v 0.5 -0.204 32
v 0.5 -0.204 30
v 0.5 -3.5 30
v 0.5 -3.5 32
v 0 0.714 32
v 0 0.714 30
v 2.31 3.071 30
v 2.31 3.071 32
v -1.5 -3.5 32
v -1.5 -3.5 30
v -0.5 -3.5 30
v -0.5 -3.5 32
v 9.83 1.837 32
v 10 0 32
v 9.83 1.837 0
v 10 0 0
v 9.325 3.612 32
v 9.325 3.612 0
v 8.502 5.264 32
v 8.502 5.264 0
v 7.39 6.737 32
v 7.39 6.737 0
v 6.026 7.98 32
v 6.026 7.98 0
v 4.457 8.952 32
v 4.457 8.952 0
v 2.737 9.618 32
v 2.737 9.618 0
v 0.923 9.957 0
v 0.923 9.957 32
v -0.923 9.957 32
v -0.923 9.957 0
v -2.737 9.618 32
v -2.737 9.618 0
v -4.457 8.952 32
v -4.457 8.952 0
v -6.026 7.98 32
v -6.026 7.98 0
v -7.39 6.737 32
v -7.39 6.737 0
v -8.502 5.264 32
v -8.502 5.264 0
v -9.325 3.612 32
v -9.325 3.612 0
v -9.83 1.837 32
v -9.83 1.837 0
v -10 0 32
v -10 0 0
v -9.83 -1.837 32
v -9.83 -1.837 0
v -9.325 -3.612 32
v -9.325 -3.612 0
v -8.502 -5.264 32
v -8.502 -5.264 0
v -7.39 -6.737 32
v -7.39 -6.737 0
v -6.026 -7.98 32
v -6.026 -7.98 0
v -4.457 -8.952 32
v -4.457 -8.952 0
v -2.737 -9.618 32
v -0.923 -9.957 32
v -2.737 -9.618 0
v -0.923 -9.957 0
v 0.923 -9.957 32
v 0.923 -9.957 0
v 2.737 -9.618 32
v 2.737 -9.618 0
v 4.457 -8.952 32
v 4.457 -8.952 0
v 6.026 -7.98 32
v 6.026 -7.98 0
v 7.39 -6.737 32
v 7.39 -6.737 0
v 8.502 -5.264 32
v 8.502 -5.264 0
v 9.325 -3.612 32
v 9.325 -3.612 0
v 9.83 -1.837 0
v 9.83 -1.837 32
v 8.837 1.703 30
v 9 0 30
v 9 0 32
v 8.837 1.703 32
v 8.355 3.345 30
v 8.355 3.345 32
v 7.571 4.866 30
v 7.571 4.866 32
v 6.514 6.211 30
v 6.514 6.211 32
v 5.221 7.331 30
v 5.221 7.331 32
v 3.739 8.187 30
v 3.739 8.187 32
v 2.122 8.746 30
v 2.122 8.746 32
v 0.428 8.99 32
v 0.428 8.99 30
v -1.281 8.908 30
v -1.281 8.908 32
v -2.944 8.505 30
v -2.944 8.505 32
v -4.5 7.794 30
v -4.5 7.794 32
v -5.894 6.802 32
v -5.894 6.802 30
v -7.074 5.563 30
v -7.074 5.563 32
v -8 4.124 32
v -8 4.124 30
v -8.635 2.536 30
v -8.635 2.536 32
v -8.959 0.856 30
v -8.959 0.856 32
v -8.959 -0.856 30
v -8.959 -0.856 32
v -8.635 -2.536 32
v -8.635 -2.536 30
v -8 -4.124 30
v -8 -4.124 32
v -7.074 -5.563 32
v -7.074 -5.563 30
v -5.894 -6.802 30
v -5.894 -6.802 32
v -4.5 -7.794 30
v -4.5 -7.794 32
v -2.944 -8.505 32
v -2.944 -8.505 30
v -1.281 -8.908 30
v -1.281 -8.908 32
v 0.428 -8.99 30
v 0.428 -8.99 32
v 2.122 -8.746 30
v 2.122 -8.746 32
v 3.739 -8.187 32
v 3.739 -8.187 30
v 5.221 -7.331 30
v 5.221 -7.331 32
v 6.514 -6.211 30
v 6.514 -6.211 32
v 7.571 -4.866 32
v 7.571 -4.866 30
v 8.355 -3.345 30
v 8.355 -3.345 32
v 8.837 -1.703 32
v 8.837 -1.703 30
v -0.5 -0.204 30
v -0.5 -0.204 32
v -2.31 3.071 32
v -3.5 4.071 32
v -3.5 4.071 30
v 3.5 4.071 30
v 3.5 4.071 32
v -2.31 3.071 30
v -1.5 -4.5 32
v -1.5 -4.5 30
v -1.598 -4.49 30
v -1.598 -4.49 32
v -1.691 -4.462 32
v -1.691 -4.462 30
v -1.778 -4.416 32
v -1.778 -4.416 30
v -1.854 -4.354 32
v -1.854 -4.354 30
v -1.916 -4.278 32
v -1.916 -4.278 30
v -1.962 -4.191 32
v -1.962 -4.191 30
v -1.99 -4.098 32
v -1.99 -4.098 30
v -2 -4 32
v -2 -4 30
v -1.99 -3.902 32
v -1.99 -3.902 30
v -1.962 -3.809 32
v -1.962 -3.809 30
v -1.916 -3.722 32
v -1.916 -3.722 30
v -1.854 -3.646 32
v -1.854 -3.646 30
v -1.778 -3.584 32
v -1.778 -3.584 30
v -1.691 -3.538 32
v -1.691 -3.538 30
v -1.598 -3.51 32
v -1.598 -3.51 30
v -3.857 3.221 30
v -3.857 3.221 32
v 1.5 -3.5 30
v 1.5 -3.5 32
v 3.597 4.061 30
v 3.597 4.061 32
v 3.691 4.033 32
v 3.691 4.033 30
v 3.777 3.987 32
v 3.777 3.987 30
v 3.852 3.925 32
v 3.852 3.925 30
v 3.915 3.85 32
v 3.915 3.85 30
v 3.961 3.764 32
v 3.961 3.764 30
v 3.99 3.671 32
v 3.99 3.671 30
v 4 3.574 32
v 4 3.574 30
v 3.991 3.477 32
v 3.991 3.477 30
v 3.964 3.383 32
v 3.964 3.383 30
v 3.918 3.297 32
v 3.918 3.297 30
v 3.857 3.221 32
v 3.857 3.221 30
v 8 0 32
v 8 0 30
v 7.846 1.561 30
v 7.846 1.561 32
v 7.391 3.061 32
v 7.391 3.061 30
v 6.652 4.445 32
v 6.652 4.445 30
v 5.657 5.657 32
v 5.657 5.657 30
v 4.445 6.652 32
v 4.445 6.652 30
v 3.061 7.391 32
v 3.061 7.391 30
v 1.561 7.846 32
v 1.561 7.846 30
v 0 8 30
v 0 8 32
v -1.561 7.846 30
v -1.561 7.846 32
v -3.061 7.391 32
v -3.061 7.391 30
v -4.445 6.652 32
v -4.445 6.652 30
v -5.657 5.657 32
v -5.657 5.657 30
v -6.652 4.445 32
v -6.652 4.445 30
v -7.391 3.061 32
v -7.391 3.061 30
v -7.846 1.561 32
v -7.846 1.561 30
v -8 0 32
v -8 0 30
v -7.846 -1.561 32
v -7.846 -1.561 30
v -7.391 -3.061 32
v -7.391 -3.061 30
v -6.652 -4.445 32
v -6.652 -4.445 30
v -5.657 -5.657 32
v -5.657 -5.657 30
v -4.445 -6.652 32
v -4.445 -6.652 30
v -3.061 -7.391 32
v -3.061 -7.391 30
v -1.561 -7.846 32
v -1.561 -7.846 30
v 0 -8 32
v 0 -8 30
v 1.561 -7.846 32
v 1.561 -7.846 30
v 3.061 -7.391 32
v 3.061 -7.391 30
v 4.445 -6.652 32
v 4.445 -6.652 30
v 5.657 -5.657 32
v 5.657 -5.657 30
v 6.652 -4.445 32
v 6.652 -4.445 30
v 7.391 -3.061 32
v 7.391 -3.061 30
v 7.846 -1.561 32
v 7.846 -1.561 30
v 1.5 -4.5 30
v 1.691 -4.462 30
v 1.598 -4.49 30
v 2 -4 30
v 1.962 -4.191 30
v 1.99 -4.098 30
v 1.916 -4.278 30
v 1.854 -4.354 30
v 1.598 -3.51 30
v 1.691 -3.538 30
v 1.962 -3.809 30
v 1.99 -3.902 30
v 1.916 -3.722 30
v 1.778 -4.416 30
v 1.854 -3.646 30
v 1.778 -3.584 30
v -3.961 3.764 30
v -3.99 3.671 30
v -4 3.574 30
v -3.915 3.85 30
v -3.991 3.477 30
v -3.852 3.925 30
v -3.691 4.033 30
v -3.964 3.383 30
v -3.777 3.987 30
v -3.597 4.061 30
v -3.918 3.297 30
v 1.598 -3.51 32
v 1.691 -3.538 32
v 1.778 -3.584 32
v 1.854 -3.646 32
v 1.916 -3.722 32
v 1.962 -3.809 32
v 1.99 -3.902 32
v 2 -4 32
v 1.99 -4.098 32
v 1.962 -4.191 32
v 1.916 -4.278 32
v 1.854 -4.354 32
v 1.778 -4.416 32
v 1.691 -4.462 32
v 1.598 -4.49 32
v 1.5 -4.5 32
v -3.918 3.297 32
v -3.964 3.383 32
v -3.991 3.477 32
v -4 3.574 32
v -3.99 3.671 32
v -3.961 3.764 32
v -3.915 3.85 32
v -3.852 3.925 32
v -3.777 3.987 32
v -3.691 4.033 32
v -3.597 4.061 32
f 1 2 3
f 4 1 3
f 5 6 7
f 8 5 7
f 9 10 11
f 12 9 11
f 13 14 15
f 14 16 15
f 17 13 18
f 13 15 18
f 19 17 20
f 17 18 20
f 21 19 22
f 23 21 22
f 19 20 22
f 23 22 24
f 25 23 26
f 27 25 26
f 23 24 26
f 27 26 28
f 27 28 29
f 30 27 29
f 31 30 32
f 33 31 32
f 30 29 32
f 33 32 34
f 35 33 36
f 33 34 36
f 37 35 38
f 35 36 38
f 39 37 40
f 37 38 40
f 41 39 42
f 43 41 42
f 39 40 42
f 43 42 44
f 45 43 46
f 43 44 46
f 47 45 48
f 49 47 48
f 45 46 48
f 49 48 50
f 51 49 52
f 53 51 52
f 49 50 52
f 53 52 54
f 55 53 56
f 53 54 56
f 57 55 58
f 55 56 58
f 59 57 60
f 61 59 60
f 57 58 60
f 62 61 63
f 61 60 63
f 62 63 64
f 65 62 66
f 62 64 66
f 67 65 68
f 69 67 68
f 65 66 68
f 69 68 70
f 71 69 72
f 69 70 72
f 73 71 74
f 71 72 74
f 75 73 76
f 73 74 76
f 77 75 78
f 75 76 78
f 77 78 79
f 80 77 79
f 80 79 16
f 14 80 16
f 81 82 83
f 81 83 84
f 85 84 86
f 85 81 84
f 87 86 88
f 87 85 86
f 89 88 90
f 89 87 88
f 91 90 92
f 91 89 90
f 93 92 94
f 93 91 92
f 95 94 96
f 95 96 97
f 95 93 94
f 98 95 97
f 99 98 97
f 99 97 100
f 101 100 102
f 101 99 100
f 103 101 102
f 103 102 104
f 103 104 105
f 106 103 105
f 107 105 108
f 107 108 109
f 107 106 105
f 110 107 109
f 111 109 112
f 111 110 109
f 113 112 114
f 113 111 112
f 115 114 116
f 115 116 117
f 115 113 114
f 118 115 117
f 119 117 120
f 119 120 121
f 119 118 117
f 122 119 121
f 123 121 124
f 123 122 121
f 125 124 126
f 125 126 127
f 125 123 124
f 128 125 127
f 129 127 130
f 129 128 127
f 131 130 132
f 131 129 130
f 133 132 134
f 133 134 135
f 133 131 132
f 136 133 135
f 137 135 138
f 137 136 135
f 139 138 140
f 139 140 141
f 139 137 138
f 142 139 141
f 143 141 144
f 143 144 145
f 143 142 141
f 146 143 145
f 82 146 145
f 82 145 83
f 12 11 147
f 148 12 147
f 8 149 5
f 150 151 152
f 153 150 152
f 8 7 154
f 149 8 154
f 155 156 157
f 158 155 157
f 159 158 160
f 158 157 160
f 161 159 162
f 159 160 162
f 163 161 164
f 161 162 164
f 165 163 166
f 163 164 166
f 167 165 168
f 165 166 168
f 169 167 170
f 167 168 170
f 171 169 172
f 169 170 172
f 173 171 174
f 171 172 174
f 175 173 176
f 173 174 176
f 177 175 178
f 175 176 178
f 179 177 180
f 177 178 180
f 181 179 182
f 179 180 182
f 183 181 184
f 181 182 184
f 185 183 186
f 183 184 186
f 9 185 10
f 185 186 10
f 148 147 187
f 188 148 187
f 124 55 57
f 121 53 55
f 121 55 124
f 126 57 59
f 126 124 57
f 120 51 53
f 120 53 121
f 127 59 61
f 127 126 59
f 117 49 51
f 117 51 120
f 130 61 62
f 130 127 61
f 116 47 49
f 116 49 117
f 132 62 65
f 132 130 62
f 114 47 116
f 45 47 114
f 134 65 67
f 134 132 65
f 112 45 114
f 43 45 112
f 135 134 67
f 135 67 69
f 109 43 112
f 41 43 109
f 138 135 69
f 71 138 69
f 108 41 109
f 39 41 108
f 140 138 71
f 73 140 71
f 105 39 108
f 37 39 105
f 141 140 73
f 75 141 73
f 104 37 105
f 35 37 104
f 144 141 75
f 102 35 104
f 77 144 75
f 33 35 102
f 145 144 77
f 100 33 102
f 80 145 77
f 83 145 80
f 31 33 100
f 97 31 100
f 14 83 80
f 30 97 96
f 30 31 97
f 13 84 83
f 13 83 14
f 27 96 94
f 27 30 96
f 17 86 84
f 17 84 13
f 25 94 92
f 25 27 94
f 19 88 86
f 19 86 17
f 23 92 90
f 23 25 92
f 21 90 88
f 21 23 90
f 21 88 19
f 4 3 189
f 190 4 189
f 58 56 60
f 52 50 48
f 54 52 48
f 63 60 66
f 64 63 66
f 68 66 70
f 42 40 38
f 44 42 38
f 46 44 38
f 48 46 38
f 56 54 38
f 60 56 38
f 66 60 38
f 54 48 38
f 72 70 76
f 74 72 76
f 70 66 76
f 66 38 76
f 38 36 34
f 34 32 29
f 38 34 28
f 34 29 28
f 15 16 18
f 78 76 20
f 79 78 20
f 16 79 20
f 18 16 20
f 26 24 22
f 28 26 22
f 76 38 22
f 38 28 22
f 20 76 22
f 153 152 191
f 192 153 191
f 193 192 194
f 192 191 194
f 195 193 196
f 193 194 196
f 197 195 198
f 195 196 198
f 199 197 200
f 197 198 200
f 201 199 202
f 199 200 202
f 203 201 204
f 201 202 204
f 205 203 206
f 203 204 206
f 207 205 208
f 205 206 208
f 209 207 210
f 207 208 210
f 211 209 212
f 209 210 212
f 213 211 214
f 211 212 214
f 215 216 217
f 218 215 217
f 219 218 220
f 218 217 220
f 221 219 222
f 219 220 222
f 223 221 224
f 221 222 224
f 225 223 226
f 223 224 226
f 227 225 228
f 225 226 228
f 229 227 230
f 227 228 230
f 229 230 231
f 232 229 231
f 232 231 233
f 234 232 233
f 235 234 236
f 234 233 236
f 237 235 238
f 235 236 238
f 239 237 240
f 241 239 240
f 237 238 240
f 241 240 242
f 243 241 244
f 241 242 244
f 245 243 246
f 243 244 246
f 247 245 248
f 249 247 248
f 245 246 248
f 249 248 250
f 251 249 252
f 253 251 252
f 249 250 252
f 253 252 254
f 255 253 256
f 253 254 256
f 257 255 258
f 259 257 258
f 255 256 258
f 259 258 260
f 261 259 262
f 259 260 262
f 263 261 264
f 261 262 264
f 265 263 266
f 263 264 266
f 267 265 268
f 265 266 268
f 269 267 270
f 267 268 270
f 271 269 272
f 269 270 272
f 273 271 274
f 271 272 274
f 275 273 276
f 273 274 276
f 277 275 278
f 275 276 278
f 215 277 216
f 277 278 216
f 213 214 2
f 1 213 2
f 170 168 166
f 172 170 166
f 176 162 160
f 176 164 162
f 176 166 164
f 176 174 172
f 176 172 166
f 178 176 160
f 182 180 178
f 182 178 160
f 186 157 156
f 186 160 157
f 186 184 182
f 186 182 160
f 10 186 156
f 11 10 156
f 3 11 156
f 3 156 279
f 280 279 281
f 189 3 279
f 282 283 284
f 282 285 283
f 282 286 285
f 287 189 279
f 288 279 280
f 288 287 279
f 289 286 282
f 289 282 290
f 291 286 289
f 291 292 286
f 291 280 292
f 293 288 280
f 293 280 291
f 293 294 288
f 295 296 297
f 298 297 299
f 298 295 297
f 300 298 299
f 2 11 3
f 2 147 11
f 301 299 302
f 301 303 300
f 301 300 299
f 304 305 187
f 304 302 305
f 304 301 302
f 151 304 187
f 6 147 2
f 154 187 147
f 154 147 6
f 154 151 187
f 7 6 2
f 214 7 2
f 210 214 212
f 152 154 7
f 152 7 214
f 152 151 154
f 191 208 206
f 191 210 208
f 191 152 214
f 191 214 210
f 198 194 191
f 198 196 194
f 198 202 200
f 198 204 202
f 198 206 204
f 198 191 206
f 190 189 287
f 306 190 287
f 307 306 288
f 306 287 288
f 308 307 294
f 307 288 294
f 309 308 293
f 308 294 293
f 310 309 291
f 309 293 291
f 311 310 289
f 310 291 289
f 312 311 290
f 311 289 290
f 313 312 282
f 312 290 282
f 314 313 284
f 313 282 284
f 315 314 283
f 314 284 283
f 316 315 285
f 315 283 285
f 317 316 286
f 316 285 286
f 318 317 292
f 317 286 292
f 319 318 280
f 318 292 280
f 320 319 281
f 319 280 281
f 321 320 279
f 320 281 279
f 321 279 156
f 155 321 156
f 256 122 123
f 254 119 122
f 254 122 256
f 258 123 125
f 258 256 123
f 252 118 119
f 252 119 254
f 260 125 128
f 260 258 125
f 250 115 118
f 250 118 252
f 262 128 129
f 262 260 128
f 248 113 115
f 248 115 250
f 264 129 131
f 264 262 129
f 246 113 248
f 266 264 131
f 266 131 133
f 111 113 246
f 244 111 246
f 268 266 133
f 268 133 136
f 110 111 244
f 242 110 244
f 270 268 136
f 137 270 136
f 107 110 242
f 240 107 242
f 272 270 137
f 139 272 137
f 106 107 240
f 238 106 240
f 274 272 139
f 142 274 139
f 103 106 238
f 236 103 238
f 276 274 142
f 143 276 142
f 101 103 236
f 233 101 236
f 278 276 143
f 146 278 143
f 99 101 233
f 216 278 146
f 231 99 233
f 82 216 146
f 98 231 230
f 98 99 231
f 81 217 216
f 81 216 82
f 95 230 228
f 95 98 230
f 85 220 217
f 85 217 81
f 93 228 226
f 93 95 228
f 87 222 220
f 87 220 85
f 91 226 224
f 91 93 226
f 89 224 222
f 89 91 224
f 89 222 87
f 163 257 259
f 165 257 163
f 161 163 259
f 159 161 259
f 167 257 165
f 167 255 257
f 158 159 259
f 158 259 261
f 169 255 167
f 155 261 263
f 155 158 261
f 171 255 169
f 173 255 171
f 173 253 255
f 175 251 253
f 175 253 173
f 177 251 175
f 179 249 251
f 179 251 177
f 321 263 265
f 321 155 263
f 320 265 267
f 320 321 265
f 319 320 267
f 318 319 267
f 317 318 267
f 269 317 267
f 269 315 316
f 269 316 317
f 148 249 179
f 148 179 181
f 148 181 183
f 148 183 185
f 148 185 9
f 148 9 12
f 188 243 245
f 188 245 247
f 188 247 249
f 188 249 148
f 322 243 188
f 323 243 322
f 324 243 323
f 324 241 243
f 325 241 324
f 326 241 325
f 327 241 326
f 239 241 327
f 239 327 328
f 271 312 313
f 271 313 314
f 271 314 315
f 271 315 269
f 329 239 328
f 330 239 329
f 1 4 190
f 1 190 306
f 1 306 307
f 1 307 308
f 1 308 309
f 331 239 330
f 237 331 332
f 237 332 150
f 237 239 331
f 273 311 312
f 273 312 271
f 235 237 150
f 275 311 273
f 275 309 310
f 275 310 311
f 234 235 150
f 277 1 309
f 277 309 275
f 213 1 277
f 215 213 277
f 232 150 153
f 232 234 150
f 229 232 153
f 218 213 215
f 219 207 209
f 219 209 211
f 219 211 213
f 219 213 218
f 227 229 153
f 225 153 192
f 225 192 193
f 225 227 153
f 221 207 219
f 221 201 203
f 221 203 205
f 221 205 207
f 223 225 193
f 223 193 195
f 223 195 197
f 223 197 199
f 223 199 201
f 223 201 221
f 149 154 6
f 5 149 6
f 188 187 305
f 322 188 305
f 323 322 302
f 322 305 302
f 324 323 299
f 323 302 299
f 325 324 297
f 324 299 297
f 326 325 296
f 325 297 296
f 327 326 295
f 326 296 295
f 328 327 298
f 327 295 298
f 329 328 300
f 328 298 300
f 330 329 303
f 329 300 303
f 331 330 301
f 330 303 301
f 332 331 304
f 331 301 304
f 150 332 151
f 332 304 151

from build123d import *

# Parameters (mm, degrees)
F0_R     = 10
F1_DEPTH = 30
F2_R     = 10
F2_R_2   = 9
F2_R_3   = 8
F3_DEPTH = 2


with BuildPart() as f1:
    # F0 (on Top) → F1 (new body)
    with BuildSketch(Plane.XY):
        Circle(F0_R)
    extrude(amount=F1_DEPTH)

    # F2 (on face) → F3 (join)
    with BuildSketch(Plane.XY.offset(30)):
        Circle(F2_R)
        Circle(F2_R_2, mode=Mode.SUBTRACT)
        Circle(F2_R_3)
        with BuildLine():
            Line((-3.5, 4.0707142143), (3.5, 4.0707142143))
            ThreePointArc((3.5, 4.0707142143), (3.9609772229, 3.7643633816), (3.8570714214, 3.2207142143))
            Line((3.8570714214, 3.2207142143), (0.5, -0.2041836837))
            Line((0.5, -0.2041836837), (0.5, -3.5))
            Line((0.5, -3.5), (1.5, -3.5))
            ThreePointArc((1.5, -3.5), (2, -4), (1.5, -4.5))
            Line((1.5, -4.5), (0, -4.5))
            Line((0, -4.5), (-1.5, -4.5))
            ThreePointArc((-1.5, -4.5), (-2, -4), (-1.5, -3.5))
            Line((-1.5, -3.5), (-0.5, -3.5))
            Line((-0.5, -3.5), (-0.5, -0.2041836837))
            Line((-0.5, -0.2041836837), (-3.8570714214, 3.2207142143))
            ThreePointArc((-3.8570714214, 3.2207142143), (-3.9609772229, 3.7643633816), (-3.5, 4.0707142143))
        make_face(mode=Mode.SUBTRACT)
        Polygon((0, 0.7142857143), (2.3097619286, 3.0707142143), (-2.3097619286, 3.0707142143), align=None)
    extrude(amount=F3_DEPTH)


solid = f1.part
